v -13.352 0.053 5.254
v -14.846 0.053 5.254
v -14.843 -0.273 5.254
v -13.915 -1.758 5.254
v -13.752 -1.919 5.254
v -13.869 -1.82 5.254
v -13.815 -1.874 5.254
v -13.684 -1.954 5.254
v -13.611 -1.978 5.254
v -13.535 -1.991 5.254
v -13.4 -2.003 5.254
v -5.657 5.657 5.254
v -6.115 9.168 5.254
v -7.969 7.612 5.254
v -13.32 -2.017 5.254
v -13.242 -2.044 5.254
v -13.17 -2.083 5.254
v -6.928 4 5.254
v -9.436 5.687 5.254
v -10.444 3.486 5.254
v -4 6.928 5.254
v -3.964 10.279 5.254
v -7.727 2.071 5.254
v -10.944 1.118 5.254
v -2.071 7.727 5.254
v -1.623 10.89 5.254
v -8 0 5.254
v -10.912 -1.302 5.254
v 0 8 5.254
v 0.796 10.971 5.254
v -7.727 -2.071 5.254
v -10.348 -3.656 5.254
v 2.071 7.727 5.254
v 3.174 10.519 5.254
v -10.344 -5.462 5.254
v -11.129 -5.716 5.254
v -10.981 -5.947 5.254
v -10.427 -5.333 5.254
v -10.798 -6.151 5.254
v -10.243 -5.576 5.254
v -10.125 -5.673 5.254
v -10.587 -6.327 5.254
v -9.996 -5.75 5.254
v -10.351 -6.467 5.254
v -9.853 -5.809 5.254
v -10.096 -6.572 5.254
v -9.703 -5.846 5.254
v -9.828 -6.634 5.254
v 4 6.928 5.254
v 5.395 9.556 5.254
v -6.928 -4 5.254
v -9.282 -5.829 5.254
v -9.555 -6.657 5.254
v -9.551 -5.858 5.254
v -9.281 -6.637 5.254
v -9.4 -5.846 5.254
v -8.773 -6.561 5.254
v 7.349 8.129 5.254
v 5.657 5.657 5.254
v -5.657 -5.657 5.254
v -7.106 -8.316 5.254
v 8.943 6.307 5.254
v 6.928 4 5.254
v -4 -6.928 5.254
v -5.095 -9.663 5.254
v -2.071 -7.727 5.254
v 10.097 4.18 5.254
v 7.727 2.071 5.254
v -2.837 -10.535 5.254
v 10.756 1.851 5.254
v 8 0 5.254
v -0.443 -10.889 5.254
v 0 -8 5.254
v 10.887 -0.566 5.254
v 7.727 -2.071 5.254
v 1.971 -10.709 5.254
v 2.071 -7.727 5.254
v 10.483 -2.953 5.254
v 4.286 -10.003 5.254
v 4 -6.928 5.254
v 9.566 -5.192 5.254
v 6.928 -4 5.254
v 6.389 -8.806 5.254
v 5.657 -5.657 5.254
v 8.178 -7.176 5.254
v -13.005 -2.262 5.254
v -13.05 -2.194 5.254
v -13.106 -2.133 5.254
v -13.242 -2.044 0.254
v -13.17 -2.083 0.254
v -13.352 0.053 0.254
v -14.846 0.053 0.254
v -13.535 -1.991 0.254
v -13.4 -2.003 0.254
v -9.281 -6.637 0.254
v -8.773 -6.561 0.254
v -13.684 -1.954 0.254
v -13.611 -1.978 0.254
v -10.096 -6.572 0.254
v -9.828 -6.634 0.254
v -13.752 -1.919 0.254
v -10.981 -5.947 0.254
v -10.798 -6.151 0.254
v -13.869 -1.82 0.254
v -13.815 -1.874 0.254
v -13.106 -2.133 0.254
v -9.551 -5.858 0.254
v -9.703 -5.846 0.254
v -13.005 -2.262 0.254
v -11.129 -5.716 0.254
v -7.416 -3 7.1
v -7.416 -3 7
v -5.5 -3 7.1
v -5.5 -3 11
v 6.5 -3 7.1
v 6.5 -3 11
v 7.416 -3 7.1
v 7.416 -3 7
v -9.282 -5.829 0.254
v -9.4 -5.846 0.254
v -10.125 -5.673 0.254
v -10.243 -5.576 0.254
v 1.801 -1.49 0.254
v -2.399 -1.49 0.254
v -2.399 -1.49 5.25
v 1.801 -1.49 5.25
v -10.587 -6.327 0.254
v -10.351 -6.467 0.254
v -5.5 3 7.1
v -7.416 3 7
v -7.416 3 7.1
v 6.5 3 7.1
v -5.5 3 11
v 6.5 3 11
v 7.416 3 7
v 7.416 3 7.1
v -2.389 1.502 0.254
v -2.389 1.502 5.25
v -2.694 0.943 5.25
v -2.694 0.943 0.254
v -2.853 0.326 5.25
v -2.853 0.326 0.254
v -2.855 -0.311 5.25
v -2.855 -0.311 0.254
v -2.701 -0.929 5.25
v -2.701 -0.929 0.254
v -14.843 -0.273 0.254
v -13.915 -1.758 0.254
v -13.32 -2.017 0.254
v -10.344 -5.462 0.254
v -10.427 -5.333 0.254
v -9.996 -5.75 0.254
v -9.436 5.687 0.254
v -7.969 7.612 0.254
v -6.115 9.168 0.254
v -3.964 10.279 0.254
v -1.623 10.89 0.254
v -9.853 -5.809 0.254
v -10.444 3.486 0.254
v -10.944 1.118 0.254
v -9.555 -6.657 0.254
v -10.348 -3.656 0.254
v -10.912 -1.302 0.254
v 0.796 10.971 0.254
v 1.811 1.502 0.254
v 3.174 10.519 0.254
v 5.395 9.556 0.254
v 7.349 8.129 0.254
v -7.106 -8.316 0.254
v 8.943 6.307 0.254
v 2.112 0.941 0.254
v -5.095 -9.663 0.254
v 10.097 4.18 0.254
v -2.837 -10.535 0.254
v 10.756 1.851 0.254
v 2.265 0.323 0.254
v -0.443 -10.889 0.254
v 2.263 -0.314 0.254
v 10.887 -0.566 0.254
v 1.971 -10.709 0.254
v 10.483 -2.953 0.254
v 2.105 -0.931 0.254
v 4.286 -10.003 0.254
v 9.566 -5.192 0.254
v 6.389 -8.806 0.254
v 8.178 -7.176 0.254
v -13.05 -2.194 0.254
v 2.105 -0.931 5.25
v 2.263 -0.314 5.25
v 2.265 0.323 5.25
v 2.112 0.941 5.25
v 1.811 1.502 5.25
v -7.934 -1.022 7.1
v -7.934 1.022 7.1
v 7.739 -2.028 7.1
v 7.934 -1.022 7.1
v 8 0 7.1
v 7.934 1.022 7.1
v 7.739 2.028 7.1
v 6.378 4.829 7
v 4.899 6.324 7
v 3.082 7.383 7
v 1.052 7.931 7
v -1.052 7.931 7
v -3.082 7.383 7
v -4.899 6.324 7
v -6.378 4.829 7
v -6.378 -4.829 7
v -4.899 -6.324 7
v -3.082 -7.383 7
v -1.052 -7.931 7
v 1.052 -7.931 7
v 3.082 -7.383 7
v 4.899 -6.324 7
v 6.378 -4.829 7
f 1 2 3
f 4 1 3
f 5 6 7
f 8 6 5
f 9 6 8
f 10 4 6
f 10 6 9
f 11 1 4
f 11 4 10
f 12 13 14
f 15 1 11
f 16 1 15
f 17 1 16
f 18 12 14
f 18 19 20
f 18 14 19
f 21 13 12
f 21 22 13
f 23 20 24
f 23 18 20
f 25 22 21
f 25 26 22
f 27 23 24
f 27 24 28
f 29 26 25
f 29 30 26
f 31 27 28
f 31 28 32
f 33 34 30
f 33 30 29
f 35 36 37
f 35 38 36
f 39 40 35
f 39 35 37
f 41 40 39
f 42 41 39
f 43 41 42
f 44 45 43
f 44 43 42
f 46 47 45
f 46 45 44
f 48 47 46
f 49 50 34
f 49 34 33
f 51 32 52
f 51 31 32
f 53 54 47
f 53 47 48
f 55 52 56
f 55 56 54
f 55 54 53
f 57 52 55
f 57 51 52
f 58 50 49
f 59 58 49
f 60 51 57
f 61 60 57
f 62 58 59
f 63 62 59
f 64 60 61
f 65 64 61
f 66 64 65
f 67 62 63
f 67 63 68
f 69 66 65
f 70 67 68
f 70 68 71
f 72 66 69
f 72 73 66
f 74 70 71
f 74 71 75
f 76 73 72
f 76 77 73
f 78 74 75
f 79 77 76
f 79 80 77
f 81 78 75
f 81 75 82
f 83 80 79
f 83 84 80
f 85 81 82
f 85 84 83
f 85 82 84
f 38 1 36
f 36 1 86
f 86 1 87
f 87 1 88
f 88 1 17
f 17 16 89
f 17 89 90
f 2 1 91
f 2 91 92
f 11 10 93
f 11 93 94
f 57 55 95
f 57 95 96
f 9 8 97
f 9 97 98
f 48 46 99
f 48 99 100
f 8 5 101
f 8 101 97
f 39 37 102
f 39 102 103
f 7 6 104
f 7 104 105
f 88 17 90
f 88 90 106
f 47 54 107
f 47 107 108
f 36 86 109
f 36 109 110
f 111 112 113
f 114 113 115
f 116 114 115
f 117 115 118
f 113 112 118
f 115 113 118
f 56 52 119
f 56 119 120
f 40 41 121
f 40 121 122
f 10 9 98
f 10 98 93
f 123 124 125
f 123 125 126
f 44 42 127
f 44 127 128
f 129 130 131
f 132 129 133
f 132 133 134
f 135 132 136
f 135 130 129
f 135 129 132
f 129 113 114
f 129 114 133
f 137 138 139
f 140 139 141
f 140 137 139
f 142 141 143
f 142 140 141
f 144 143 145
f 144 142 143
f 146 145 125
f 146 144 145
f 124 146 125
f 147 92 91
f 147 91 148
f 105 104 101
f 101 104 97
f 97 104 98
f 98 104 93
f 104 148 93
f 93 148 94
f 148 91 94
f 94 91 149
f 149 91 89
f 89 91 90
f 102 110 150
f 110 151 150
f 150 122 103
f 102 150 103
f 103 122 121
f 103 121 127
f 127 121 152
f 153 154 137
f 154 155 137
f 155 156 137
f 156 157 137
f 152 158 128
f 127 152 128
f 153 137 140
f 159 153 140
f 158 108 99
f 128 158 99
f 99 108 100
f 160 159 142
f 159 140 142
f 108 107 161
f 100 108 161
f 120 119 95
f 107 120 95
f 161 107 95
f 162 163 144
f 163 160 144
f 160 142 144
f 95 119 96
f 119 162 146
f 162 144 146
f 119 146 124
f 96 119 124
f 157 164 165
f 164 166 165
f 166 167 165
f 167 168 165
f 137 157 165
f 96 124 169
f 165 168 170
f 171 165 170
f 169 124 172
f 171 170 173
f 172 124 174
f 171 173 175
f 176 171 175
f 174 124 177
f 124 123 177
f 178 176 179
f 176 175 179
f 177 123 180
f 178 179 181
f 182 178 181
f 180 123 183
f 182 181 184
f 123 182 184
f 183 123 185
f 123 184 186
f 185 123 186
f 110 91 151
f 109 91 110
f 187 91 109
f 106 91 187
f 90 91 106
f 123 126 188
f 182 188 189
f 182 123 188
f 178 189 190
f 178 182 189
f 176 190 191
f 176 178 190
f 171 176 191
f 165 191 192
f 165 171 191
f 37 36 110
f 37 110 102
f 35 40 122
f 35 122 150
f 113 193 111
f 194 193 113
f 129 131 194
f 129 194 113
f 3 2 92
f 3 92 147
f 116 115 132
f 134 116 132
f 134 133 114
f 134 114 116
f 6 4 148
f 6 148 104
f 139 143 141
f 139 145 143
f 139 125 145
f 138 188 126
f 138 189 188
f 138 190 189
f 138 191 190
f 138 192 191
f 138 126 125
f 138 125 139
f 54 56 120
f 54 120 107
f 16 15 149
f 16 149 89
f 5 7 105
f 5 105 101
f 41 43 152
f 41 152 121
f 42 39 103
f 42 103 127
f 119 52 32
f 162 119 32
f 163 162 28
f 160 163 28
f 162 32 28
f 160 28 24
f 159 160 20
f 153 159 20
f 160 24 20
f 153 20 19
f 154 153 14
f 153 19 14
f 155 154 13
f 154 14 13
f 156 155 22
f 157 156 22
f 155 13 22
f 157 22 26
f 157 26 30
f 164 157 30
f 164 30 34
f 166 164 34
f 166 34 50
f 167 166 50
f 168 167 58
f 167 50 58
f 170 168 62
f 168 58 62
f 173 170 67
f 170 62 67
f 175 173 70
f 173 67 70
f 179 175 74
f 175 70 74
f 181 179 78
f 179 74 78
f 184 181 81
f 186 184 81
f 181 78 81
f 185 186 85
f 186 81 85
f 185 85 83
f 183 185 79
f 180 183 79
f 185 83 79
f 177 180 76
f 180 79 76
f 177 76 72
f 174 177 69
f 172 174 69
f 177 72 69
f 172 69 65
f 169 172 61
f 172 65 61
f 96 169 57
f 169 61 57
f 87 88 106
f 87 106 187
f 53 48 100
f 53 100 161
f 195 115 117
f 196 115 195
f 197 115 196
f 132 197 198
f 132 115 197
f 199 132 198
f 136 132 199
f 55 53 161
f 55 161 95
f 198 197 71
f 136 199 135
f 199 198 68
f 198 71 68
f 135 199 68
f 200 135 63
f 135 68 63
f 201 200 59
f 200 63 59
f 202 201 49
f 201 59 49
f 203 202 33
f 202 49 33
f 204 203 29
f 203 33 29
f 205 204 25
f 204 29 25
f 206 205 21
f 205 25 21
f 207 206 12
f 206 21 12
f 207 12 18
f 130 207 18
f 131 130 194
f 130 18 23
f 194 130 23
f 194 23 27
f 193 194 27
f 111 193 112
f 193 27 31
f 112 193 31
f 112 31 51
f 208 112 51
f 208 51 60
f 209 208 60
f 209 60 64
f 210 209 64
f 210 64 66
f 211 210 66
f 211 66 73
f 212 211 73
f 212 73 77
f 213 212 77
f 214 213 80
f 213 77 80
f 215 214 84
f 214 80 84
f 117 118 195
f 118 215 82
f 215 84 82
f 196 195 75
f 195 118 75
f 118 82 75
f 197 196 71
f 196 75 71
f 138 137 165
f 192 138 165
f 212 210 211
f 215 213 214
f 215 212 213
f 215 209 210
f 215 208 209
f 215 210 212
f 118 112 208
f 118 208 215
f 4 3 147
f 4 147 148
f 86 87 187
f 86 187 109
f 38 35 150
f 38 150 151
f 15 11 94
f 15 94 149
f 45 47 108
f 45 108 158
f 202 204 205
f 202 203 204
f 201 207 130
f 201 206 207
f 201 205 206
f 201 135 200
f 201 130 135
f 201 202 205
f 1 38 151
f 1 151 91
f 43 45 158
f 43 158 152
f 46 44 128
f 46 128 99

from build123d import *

# Parameters (mm, degrees)
EXTRUDE001_DEPTH        = 10
BOX004_W                = 17
BOX004_H                = 16
BOX004_DEPTH            = 25
BOX005_W                = 17
BOX005_H                = 16
BOX005_DEPTH            = 25
BOX006_W                = 17
BOX006_H                = 16
BOX006_DEPTH            = 25
BOX003_W                = 17
BOX003_H                = 16
BOX003_DEPTH            = 25
CYLINDER006_R           = 8
CYLINDER006_DEPTH       = 6
EXTRUDE_DEPTH           = 5
EXTRUDE_PLACEMENT_ANGLE = 90


with BuildPart() as stepper_axis:
    # Sketch003 (on Face140 of Part__Feature) → Extrude001 (new body)
    with BuildSketch(Plane(origin=(-0.300362, -8.01257, -12.75), x_dir=(1, 0, 0), z_dir=(0, 0, 1))):
        with BuildLine():
            Line((-2.088538, 9.514445), (2.111462, 9.514445))
            ThreePointArc((2.101642, 6.522728), (2.584459, 8.017018), (2.111462, 9.514445))
            Line((-2.098358, 6.522728), (2.101642, 6.522728))
            ThreePointArc((-2.088538, 9.514445), (-2.573641, 8.020163), (-2.098358, 6.522728))
        make_face()
    extrude(amount=EXTRUDE001_DEPTH)


with BuildPart() as stepper_axis_1:
    # Extrude001 placement: moved
    add(stepper_axis.part.moved(Location((0, 0, 3))))


with BuildPart() as cube004:
    # Box004 → Box004 (new body)
    with BuildSketch(Plane(origin=(-8.5, -19, 2), x_dir=(1, 0, 0), z_dir=(0, 0, 1))):
        with Locations((8.5, 8)):
            Rectangle(BOX004_W, BOX004_H)
    extrude(amount=BOX004_DEPTH)


with BuildPart() as cube005:
    # Box005 → Box005 (new body)
    with BuildSketch(Plane(origin=(6.5, -3, 2.1), x_dir=(1, 0, 0), z_dir=(0, 0, 1))):
        with Locations((8.5, 8)):
            Rectangle(BOX005_W, BOX005_H)
    extrude(amount=BOX005_DEPTH)


with BuildPart() as cube006:
    # Box006 → Box006 (new body)
    with BuildSketch(Plane(origin=(-22.5, -12, 2.1), x_dir=(1, 0, 0), z_dir=(0, 0, 1))):
        with Locations((8.5, 8)):
            Rectangle(BOX006_W, BOX006_H)
    extrude(amount=BOX006_DEPTH)


with BuildPart() as fusion001:
    # Box003 → Box003 (new body)
    with BuildSketch(Plane(origin=(-8.5, 3, 2), x_dir=(1, 0, 0), z_dir=(0, 0, 1))):
        with Locations((8.5, 8)):
            Rectangle(BOX003_W, BOX003_H)
    extrude(amount=BOX003_DEPTH)

    # Fusion001: union Cube004, Cube005, Cube006
    add(cube004.part)
    add(cube005.part)
    add(cube006.part)


with BuildPart() as cut004:
    # Cylinder006 → Cylinder006 (new body)
    with BuildSketch(Plane.XY):
        Circle(CYLINDER006_R)
    extrude(amount=CYLINDER006_DEPTH)

    # Cut004: cut Fusion001
    add(fusion001.part, mode=Mode.SUBTRACT)


with BuildPart() as clutch_fit:
    # Sketch → Extrude (new body)
    with BuildSketch(Plane.YZ):
        with BuildLine():
            Line((76.233353, -16.168262), (76.215729, -16.28697))
            Line((76.215729, -16.28697), (76.204231, -16.437162))
            Line((76.204231, -16.437162), (76.215622, -16.589155))
            Line((76.215622, -16.589155), (76.252785, -16.739346))
            Line((76.252785, -16.739346), (76.312019, -16.88286))
            Line((76.312019, -16.88286), (76.388969, -17.011848))
            Line((76.388969, -17.011848), (76.485733, -17.129137))
            Line((76.485733, -17.129137), (76.599709, -17.23061))
            Line((76.599709, -17.23061), (76.728439, -17.313751))
            Line((76.728439, -17.313751), (82.114944, -20.238707))
            Line((82.114944, -20.238707), (82.114944, -21.732918))
            Line((82.114944, -21.732918), (81.789139, -21.729336))
            Line((81.789139, -21.729336), (80.303963, -20.801414))
            Line((80.303963, -20.801414), (80.242294, -20.755711))
            Line((80.242294, -20.755711), (80.188026, -20.701096))
            Line((80.188026, -20.701096), (80.142899, -20.638897))
            Line((80.142899, -20.638897), (80.107841, -20.570471))
            Line((80.107841, -20.570471), (80.083717, -20.497528))
            Line((80.083717, -20.497528), (80.071022, -20.421675))
            Line((80.071022, -20.421675), (80.059006, -20.286879))
            Line((80.059006, -20.286879), (80.045197, -20.206167))
            Line((80.045197, -20.206167), (80.01815, -20.128645))
            Line((80.01815, -20.128645), (79.97892, -20.056633))
            Line((79.97892, -20.056633), (79.92849, -19.992046))
            Line((79.92849, -19.992046), (79.868156, -19.936562))
            Line((79.868156, -19.936562), (79.799576, -19.891676))
            Line((79.799576, -19.891676), (76.345589, -18.015881))
            Line((76.345589, -18.015881), (76.11525, -17.86721))
            Line((76.11525, -17.86721), (75.910469, -17.684519))
            Line((75.910469, -17.684519), (75.734512, -17.473183))
            Line((75.734512, -17.473183), (75.59462, -17.237131))
            Line((75.59462, -17.237131), (75.490318, -16.982098))
            Line((75.490318, -16.982098), (75.42775, -16.714771))
            Line((75.42775, -16.714771), (75.404984, -16.441053))
            Line((75.404984, -16.441053), (75.425179, -16.167168))
            Line((75.425179, -16.167168), (75.501405, -15.659048))
            ThreePointArc((76.233353, -16.168262), (88.369051, 2.056336), (75.501405, -15.659048))
        make_face()
    extrude(amount=EXTRUDE_DEPTH)


with BuildPart() as clutch_fit_1:
    # Extrude placement: moved
    add(clutch_fit.part.moved(Location((6.886491, -82.061934, 0.254467))).rotate(Axis((6.886491, -82.061934, 0.254467), (0, 1, 0)), EXTRUDE_PLACEMENT_ANGLE))

    # Fusion002: union Cut004
    add(cut004.part)

    # Cut007: cut stepper_axis
    add(stepper_axis_1.part, mode=Mode.SUBTRACT)


with BuildPart() as clutch_fit_2:
    # Cut007 placement: moved
    add(clutch_fit_1.part.moved(Location((0, 0, 5))))


solid = clutch_fit_2.part
